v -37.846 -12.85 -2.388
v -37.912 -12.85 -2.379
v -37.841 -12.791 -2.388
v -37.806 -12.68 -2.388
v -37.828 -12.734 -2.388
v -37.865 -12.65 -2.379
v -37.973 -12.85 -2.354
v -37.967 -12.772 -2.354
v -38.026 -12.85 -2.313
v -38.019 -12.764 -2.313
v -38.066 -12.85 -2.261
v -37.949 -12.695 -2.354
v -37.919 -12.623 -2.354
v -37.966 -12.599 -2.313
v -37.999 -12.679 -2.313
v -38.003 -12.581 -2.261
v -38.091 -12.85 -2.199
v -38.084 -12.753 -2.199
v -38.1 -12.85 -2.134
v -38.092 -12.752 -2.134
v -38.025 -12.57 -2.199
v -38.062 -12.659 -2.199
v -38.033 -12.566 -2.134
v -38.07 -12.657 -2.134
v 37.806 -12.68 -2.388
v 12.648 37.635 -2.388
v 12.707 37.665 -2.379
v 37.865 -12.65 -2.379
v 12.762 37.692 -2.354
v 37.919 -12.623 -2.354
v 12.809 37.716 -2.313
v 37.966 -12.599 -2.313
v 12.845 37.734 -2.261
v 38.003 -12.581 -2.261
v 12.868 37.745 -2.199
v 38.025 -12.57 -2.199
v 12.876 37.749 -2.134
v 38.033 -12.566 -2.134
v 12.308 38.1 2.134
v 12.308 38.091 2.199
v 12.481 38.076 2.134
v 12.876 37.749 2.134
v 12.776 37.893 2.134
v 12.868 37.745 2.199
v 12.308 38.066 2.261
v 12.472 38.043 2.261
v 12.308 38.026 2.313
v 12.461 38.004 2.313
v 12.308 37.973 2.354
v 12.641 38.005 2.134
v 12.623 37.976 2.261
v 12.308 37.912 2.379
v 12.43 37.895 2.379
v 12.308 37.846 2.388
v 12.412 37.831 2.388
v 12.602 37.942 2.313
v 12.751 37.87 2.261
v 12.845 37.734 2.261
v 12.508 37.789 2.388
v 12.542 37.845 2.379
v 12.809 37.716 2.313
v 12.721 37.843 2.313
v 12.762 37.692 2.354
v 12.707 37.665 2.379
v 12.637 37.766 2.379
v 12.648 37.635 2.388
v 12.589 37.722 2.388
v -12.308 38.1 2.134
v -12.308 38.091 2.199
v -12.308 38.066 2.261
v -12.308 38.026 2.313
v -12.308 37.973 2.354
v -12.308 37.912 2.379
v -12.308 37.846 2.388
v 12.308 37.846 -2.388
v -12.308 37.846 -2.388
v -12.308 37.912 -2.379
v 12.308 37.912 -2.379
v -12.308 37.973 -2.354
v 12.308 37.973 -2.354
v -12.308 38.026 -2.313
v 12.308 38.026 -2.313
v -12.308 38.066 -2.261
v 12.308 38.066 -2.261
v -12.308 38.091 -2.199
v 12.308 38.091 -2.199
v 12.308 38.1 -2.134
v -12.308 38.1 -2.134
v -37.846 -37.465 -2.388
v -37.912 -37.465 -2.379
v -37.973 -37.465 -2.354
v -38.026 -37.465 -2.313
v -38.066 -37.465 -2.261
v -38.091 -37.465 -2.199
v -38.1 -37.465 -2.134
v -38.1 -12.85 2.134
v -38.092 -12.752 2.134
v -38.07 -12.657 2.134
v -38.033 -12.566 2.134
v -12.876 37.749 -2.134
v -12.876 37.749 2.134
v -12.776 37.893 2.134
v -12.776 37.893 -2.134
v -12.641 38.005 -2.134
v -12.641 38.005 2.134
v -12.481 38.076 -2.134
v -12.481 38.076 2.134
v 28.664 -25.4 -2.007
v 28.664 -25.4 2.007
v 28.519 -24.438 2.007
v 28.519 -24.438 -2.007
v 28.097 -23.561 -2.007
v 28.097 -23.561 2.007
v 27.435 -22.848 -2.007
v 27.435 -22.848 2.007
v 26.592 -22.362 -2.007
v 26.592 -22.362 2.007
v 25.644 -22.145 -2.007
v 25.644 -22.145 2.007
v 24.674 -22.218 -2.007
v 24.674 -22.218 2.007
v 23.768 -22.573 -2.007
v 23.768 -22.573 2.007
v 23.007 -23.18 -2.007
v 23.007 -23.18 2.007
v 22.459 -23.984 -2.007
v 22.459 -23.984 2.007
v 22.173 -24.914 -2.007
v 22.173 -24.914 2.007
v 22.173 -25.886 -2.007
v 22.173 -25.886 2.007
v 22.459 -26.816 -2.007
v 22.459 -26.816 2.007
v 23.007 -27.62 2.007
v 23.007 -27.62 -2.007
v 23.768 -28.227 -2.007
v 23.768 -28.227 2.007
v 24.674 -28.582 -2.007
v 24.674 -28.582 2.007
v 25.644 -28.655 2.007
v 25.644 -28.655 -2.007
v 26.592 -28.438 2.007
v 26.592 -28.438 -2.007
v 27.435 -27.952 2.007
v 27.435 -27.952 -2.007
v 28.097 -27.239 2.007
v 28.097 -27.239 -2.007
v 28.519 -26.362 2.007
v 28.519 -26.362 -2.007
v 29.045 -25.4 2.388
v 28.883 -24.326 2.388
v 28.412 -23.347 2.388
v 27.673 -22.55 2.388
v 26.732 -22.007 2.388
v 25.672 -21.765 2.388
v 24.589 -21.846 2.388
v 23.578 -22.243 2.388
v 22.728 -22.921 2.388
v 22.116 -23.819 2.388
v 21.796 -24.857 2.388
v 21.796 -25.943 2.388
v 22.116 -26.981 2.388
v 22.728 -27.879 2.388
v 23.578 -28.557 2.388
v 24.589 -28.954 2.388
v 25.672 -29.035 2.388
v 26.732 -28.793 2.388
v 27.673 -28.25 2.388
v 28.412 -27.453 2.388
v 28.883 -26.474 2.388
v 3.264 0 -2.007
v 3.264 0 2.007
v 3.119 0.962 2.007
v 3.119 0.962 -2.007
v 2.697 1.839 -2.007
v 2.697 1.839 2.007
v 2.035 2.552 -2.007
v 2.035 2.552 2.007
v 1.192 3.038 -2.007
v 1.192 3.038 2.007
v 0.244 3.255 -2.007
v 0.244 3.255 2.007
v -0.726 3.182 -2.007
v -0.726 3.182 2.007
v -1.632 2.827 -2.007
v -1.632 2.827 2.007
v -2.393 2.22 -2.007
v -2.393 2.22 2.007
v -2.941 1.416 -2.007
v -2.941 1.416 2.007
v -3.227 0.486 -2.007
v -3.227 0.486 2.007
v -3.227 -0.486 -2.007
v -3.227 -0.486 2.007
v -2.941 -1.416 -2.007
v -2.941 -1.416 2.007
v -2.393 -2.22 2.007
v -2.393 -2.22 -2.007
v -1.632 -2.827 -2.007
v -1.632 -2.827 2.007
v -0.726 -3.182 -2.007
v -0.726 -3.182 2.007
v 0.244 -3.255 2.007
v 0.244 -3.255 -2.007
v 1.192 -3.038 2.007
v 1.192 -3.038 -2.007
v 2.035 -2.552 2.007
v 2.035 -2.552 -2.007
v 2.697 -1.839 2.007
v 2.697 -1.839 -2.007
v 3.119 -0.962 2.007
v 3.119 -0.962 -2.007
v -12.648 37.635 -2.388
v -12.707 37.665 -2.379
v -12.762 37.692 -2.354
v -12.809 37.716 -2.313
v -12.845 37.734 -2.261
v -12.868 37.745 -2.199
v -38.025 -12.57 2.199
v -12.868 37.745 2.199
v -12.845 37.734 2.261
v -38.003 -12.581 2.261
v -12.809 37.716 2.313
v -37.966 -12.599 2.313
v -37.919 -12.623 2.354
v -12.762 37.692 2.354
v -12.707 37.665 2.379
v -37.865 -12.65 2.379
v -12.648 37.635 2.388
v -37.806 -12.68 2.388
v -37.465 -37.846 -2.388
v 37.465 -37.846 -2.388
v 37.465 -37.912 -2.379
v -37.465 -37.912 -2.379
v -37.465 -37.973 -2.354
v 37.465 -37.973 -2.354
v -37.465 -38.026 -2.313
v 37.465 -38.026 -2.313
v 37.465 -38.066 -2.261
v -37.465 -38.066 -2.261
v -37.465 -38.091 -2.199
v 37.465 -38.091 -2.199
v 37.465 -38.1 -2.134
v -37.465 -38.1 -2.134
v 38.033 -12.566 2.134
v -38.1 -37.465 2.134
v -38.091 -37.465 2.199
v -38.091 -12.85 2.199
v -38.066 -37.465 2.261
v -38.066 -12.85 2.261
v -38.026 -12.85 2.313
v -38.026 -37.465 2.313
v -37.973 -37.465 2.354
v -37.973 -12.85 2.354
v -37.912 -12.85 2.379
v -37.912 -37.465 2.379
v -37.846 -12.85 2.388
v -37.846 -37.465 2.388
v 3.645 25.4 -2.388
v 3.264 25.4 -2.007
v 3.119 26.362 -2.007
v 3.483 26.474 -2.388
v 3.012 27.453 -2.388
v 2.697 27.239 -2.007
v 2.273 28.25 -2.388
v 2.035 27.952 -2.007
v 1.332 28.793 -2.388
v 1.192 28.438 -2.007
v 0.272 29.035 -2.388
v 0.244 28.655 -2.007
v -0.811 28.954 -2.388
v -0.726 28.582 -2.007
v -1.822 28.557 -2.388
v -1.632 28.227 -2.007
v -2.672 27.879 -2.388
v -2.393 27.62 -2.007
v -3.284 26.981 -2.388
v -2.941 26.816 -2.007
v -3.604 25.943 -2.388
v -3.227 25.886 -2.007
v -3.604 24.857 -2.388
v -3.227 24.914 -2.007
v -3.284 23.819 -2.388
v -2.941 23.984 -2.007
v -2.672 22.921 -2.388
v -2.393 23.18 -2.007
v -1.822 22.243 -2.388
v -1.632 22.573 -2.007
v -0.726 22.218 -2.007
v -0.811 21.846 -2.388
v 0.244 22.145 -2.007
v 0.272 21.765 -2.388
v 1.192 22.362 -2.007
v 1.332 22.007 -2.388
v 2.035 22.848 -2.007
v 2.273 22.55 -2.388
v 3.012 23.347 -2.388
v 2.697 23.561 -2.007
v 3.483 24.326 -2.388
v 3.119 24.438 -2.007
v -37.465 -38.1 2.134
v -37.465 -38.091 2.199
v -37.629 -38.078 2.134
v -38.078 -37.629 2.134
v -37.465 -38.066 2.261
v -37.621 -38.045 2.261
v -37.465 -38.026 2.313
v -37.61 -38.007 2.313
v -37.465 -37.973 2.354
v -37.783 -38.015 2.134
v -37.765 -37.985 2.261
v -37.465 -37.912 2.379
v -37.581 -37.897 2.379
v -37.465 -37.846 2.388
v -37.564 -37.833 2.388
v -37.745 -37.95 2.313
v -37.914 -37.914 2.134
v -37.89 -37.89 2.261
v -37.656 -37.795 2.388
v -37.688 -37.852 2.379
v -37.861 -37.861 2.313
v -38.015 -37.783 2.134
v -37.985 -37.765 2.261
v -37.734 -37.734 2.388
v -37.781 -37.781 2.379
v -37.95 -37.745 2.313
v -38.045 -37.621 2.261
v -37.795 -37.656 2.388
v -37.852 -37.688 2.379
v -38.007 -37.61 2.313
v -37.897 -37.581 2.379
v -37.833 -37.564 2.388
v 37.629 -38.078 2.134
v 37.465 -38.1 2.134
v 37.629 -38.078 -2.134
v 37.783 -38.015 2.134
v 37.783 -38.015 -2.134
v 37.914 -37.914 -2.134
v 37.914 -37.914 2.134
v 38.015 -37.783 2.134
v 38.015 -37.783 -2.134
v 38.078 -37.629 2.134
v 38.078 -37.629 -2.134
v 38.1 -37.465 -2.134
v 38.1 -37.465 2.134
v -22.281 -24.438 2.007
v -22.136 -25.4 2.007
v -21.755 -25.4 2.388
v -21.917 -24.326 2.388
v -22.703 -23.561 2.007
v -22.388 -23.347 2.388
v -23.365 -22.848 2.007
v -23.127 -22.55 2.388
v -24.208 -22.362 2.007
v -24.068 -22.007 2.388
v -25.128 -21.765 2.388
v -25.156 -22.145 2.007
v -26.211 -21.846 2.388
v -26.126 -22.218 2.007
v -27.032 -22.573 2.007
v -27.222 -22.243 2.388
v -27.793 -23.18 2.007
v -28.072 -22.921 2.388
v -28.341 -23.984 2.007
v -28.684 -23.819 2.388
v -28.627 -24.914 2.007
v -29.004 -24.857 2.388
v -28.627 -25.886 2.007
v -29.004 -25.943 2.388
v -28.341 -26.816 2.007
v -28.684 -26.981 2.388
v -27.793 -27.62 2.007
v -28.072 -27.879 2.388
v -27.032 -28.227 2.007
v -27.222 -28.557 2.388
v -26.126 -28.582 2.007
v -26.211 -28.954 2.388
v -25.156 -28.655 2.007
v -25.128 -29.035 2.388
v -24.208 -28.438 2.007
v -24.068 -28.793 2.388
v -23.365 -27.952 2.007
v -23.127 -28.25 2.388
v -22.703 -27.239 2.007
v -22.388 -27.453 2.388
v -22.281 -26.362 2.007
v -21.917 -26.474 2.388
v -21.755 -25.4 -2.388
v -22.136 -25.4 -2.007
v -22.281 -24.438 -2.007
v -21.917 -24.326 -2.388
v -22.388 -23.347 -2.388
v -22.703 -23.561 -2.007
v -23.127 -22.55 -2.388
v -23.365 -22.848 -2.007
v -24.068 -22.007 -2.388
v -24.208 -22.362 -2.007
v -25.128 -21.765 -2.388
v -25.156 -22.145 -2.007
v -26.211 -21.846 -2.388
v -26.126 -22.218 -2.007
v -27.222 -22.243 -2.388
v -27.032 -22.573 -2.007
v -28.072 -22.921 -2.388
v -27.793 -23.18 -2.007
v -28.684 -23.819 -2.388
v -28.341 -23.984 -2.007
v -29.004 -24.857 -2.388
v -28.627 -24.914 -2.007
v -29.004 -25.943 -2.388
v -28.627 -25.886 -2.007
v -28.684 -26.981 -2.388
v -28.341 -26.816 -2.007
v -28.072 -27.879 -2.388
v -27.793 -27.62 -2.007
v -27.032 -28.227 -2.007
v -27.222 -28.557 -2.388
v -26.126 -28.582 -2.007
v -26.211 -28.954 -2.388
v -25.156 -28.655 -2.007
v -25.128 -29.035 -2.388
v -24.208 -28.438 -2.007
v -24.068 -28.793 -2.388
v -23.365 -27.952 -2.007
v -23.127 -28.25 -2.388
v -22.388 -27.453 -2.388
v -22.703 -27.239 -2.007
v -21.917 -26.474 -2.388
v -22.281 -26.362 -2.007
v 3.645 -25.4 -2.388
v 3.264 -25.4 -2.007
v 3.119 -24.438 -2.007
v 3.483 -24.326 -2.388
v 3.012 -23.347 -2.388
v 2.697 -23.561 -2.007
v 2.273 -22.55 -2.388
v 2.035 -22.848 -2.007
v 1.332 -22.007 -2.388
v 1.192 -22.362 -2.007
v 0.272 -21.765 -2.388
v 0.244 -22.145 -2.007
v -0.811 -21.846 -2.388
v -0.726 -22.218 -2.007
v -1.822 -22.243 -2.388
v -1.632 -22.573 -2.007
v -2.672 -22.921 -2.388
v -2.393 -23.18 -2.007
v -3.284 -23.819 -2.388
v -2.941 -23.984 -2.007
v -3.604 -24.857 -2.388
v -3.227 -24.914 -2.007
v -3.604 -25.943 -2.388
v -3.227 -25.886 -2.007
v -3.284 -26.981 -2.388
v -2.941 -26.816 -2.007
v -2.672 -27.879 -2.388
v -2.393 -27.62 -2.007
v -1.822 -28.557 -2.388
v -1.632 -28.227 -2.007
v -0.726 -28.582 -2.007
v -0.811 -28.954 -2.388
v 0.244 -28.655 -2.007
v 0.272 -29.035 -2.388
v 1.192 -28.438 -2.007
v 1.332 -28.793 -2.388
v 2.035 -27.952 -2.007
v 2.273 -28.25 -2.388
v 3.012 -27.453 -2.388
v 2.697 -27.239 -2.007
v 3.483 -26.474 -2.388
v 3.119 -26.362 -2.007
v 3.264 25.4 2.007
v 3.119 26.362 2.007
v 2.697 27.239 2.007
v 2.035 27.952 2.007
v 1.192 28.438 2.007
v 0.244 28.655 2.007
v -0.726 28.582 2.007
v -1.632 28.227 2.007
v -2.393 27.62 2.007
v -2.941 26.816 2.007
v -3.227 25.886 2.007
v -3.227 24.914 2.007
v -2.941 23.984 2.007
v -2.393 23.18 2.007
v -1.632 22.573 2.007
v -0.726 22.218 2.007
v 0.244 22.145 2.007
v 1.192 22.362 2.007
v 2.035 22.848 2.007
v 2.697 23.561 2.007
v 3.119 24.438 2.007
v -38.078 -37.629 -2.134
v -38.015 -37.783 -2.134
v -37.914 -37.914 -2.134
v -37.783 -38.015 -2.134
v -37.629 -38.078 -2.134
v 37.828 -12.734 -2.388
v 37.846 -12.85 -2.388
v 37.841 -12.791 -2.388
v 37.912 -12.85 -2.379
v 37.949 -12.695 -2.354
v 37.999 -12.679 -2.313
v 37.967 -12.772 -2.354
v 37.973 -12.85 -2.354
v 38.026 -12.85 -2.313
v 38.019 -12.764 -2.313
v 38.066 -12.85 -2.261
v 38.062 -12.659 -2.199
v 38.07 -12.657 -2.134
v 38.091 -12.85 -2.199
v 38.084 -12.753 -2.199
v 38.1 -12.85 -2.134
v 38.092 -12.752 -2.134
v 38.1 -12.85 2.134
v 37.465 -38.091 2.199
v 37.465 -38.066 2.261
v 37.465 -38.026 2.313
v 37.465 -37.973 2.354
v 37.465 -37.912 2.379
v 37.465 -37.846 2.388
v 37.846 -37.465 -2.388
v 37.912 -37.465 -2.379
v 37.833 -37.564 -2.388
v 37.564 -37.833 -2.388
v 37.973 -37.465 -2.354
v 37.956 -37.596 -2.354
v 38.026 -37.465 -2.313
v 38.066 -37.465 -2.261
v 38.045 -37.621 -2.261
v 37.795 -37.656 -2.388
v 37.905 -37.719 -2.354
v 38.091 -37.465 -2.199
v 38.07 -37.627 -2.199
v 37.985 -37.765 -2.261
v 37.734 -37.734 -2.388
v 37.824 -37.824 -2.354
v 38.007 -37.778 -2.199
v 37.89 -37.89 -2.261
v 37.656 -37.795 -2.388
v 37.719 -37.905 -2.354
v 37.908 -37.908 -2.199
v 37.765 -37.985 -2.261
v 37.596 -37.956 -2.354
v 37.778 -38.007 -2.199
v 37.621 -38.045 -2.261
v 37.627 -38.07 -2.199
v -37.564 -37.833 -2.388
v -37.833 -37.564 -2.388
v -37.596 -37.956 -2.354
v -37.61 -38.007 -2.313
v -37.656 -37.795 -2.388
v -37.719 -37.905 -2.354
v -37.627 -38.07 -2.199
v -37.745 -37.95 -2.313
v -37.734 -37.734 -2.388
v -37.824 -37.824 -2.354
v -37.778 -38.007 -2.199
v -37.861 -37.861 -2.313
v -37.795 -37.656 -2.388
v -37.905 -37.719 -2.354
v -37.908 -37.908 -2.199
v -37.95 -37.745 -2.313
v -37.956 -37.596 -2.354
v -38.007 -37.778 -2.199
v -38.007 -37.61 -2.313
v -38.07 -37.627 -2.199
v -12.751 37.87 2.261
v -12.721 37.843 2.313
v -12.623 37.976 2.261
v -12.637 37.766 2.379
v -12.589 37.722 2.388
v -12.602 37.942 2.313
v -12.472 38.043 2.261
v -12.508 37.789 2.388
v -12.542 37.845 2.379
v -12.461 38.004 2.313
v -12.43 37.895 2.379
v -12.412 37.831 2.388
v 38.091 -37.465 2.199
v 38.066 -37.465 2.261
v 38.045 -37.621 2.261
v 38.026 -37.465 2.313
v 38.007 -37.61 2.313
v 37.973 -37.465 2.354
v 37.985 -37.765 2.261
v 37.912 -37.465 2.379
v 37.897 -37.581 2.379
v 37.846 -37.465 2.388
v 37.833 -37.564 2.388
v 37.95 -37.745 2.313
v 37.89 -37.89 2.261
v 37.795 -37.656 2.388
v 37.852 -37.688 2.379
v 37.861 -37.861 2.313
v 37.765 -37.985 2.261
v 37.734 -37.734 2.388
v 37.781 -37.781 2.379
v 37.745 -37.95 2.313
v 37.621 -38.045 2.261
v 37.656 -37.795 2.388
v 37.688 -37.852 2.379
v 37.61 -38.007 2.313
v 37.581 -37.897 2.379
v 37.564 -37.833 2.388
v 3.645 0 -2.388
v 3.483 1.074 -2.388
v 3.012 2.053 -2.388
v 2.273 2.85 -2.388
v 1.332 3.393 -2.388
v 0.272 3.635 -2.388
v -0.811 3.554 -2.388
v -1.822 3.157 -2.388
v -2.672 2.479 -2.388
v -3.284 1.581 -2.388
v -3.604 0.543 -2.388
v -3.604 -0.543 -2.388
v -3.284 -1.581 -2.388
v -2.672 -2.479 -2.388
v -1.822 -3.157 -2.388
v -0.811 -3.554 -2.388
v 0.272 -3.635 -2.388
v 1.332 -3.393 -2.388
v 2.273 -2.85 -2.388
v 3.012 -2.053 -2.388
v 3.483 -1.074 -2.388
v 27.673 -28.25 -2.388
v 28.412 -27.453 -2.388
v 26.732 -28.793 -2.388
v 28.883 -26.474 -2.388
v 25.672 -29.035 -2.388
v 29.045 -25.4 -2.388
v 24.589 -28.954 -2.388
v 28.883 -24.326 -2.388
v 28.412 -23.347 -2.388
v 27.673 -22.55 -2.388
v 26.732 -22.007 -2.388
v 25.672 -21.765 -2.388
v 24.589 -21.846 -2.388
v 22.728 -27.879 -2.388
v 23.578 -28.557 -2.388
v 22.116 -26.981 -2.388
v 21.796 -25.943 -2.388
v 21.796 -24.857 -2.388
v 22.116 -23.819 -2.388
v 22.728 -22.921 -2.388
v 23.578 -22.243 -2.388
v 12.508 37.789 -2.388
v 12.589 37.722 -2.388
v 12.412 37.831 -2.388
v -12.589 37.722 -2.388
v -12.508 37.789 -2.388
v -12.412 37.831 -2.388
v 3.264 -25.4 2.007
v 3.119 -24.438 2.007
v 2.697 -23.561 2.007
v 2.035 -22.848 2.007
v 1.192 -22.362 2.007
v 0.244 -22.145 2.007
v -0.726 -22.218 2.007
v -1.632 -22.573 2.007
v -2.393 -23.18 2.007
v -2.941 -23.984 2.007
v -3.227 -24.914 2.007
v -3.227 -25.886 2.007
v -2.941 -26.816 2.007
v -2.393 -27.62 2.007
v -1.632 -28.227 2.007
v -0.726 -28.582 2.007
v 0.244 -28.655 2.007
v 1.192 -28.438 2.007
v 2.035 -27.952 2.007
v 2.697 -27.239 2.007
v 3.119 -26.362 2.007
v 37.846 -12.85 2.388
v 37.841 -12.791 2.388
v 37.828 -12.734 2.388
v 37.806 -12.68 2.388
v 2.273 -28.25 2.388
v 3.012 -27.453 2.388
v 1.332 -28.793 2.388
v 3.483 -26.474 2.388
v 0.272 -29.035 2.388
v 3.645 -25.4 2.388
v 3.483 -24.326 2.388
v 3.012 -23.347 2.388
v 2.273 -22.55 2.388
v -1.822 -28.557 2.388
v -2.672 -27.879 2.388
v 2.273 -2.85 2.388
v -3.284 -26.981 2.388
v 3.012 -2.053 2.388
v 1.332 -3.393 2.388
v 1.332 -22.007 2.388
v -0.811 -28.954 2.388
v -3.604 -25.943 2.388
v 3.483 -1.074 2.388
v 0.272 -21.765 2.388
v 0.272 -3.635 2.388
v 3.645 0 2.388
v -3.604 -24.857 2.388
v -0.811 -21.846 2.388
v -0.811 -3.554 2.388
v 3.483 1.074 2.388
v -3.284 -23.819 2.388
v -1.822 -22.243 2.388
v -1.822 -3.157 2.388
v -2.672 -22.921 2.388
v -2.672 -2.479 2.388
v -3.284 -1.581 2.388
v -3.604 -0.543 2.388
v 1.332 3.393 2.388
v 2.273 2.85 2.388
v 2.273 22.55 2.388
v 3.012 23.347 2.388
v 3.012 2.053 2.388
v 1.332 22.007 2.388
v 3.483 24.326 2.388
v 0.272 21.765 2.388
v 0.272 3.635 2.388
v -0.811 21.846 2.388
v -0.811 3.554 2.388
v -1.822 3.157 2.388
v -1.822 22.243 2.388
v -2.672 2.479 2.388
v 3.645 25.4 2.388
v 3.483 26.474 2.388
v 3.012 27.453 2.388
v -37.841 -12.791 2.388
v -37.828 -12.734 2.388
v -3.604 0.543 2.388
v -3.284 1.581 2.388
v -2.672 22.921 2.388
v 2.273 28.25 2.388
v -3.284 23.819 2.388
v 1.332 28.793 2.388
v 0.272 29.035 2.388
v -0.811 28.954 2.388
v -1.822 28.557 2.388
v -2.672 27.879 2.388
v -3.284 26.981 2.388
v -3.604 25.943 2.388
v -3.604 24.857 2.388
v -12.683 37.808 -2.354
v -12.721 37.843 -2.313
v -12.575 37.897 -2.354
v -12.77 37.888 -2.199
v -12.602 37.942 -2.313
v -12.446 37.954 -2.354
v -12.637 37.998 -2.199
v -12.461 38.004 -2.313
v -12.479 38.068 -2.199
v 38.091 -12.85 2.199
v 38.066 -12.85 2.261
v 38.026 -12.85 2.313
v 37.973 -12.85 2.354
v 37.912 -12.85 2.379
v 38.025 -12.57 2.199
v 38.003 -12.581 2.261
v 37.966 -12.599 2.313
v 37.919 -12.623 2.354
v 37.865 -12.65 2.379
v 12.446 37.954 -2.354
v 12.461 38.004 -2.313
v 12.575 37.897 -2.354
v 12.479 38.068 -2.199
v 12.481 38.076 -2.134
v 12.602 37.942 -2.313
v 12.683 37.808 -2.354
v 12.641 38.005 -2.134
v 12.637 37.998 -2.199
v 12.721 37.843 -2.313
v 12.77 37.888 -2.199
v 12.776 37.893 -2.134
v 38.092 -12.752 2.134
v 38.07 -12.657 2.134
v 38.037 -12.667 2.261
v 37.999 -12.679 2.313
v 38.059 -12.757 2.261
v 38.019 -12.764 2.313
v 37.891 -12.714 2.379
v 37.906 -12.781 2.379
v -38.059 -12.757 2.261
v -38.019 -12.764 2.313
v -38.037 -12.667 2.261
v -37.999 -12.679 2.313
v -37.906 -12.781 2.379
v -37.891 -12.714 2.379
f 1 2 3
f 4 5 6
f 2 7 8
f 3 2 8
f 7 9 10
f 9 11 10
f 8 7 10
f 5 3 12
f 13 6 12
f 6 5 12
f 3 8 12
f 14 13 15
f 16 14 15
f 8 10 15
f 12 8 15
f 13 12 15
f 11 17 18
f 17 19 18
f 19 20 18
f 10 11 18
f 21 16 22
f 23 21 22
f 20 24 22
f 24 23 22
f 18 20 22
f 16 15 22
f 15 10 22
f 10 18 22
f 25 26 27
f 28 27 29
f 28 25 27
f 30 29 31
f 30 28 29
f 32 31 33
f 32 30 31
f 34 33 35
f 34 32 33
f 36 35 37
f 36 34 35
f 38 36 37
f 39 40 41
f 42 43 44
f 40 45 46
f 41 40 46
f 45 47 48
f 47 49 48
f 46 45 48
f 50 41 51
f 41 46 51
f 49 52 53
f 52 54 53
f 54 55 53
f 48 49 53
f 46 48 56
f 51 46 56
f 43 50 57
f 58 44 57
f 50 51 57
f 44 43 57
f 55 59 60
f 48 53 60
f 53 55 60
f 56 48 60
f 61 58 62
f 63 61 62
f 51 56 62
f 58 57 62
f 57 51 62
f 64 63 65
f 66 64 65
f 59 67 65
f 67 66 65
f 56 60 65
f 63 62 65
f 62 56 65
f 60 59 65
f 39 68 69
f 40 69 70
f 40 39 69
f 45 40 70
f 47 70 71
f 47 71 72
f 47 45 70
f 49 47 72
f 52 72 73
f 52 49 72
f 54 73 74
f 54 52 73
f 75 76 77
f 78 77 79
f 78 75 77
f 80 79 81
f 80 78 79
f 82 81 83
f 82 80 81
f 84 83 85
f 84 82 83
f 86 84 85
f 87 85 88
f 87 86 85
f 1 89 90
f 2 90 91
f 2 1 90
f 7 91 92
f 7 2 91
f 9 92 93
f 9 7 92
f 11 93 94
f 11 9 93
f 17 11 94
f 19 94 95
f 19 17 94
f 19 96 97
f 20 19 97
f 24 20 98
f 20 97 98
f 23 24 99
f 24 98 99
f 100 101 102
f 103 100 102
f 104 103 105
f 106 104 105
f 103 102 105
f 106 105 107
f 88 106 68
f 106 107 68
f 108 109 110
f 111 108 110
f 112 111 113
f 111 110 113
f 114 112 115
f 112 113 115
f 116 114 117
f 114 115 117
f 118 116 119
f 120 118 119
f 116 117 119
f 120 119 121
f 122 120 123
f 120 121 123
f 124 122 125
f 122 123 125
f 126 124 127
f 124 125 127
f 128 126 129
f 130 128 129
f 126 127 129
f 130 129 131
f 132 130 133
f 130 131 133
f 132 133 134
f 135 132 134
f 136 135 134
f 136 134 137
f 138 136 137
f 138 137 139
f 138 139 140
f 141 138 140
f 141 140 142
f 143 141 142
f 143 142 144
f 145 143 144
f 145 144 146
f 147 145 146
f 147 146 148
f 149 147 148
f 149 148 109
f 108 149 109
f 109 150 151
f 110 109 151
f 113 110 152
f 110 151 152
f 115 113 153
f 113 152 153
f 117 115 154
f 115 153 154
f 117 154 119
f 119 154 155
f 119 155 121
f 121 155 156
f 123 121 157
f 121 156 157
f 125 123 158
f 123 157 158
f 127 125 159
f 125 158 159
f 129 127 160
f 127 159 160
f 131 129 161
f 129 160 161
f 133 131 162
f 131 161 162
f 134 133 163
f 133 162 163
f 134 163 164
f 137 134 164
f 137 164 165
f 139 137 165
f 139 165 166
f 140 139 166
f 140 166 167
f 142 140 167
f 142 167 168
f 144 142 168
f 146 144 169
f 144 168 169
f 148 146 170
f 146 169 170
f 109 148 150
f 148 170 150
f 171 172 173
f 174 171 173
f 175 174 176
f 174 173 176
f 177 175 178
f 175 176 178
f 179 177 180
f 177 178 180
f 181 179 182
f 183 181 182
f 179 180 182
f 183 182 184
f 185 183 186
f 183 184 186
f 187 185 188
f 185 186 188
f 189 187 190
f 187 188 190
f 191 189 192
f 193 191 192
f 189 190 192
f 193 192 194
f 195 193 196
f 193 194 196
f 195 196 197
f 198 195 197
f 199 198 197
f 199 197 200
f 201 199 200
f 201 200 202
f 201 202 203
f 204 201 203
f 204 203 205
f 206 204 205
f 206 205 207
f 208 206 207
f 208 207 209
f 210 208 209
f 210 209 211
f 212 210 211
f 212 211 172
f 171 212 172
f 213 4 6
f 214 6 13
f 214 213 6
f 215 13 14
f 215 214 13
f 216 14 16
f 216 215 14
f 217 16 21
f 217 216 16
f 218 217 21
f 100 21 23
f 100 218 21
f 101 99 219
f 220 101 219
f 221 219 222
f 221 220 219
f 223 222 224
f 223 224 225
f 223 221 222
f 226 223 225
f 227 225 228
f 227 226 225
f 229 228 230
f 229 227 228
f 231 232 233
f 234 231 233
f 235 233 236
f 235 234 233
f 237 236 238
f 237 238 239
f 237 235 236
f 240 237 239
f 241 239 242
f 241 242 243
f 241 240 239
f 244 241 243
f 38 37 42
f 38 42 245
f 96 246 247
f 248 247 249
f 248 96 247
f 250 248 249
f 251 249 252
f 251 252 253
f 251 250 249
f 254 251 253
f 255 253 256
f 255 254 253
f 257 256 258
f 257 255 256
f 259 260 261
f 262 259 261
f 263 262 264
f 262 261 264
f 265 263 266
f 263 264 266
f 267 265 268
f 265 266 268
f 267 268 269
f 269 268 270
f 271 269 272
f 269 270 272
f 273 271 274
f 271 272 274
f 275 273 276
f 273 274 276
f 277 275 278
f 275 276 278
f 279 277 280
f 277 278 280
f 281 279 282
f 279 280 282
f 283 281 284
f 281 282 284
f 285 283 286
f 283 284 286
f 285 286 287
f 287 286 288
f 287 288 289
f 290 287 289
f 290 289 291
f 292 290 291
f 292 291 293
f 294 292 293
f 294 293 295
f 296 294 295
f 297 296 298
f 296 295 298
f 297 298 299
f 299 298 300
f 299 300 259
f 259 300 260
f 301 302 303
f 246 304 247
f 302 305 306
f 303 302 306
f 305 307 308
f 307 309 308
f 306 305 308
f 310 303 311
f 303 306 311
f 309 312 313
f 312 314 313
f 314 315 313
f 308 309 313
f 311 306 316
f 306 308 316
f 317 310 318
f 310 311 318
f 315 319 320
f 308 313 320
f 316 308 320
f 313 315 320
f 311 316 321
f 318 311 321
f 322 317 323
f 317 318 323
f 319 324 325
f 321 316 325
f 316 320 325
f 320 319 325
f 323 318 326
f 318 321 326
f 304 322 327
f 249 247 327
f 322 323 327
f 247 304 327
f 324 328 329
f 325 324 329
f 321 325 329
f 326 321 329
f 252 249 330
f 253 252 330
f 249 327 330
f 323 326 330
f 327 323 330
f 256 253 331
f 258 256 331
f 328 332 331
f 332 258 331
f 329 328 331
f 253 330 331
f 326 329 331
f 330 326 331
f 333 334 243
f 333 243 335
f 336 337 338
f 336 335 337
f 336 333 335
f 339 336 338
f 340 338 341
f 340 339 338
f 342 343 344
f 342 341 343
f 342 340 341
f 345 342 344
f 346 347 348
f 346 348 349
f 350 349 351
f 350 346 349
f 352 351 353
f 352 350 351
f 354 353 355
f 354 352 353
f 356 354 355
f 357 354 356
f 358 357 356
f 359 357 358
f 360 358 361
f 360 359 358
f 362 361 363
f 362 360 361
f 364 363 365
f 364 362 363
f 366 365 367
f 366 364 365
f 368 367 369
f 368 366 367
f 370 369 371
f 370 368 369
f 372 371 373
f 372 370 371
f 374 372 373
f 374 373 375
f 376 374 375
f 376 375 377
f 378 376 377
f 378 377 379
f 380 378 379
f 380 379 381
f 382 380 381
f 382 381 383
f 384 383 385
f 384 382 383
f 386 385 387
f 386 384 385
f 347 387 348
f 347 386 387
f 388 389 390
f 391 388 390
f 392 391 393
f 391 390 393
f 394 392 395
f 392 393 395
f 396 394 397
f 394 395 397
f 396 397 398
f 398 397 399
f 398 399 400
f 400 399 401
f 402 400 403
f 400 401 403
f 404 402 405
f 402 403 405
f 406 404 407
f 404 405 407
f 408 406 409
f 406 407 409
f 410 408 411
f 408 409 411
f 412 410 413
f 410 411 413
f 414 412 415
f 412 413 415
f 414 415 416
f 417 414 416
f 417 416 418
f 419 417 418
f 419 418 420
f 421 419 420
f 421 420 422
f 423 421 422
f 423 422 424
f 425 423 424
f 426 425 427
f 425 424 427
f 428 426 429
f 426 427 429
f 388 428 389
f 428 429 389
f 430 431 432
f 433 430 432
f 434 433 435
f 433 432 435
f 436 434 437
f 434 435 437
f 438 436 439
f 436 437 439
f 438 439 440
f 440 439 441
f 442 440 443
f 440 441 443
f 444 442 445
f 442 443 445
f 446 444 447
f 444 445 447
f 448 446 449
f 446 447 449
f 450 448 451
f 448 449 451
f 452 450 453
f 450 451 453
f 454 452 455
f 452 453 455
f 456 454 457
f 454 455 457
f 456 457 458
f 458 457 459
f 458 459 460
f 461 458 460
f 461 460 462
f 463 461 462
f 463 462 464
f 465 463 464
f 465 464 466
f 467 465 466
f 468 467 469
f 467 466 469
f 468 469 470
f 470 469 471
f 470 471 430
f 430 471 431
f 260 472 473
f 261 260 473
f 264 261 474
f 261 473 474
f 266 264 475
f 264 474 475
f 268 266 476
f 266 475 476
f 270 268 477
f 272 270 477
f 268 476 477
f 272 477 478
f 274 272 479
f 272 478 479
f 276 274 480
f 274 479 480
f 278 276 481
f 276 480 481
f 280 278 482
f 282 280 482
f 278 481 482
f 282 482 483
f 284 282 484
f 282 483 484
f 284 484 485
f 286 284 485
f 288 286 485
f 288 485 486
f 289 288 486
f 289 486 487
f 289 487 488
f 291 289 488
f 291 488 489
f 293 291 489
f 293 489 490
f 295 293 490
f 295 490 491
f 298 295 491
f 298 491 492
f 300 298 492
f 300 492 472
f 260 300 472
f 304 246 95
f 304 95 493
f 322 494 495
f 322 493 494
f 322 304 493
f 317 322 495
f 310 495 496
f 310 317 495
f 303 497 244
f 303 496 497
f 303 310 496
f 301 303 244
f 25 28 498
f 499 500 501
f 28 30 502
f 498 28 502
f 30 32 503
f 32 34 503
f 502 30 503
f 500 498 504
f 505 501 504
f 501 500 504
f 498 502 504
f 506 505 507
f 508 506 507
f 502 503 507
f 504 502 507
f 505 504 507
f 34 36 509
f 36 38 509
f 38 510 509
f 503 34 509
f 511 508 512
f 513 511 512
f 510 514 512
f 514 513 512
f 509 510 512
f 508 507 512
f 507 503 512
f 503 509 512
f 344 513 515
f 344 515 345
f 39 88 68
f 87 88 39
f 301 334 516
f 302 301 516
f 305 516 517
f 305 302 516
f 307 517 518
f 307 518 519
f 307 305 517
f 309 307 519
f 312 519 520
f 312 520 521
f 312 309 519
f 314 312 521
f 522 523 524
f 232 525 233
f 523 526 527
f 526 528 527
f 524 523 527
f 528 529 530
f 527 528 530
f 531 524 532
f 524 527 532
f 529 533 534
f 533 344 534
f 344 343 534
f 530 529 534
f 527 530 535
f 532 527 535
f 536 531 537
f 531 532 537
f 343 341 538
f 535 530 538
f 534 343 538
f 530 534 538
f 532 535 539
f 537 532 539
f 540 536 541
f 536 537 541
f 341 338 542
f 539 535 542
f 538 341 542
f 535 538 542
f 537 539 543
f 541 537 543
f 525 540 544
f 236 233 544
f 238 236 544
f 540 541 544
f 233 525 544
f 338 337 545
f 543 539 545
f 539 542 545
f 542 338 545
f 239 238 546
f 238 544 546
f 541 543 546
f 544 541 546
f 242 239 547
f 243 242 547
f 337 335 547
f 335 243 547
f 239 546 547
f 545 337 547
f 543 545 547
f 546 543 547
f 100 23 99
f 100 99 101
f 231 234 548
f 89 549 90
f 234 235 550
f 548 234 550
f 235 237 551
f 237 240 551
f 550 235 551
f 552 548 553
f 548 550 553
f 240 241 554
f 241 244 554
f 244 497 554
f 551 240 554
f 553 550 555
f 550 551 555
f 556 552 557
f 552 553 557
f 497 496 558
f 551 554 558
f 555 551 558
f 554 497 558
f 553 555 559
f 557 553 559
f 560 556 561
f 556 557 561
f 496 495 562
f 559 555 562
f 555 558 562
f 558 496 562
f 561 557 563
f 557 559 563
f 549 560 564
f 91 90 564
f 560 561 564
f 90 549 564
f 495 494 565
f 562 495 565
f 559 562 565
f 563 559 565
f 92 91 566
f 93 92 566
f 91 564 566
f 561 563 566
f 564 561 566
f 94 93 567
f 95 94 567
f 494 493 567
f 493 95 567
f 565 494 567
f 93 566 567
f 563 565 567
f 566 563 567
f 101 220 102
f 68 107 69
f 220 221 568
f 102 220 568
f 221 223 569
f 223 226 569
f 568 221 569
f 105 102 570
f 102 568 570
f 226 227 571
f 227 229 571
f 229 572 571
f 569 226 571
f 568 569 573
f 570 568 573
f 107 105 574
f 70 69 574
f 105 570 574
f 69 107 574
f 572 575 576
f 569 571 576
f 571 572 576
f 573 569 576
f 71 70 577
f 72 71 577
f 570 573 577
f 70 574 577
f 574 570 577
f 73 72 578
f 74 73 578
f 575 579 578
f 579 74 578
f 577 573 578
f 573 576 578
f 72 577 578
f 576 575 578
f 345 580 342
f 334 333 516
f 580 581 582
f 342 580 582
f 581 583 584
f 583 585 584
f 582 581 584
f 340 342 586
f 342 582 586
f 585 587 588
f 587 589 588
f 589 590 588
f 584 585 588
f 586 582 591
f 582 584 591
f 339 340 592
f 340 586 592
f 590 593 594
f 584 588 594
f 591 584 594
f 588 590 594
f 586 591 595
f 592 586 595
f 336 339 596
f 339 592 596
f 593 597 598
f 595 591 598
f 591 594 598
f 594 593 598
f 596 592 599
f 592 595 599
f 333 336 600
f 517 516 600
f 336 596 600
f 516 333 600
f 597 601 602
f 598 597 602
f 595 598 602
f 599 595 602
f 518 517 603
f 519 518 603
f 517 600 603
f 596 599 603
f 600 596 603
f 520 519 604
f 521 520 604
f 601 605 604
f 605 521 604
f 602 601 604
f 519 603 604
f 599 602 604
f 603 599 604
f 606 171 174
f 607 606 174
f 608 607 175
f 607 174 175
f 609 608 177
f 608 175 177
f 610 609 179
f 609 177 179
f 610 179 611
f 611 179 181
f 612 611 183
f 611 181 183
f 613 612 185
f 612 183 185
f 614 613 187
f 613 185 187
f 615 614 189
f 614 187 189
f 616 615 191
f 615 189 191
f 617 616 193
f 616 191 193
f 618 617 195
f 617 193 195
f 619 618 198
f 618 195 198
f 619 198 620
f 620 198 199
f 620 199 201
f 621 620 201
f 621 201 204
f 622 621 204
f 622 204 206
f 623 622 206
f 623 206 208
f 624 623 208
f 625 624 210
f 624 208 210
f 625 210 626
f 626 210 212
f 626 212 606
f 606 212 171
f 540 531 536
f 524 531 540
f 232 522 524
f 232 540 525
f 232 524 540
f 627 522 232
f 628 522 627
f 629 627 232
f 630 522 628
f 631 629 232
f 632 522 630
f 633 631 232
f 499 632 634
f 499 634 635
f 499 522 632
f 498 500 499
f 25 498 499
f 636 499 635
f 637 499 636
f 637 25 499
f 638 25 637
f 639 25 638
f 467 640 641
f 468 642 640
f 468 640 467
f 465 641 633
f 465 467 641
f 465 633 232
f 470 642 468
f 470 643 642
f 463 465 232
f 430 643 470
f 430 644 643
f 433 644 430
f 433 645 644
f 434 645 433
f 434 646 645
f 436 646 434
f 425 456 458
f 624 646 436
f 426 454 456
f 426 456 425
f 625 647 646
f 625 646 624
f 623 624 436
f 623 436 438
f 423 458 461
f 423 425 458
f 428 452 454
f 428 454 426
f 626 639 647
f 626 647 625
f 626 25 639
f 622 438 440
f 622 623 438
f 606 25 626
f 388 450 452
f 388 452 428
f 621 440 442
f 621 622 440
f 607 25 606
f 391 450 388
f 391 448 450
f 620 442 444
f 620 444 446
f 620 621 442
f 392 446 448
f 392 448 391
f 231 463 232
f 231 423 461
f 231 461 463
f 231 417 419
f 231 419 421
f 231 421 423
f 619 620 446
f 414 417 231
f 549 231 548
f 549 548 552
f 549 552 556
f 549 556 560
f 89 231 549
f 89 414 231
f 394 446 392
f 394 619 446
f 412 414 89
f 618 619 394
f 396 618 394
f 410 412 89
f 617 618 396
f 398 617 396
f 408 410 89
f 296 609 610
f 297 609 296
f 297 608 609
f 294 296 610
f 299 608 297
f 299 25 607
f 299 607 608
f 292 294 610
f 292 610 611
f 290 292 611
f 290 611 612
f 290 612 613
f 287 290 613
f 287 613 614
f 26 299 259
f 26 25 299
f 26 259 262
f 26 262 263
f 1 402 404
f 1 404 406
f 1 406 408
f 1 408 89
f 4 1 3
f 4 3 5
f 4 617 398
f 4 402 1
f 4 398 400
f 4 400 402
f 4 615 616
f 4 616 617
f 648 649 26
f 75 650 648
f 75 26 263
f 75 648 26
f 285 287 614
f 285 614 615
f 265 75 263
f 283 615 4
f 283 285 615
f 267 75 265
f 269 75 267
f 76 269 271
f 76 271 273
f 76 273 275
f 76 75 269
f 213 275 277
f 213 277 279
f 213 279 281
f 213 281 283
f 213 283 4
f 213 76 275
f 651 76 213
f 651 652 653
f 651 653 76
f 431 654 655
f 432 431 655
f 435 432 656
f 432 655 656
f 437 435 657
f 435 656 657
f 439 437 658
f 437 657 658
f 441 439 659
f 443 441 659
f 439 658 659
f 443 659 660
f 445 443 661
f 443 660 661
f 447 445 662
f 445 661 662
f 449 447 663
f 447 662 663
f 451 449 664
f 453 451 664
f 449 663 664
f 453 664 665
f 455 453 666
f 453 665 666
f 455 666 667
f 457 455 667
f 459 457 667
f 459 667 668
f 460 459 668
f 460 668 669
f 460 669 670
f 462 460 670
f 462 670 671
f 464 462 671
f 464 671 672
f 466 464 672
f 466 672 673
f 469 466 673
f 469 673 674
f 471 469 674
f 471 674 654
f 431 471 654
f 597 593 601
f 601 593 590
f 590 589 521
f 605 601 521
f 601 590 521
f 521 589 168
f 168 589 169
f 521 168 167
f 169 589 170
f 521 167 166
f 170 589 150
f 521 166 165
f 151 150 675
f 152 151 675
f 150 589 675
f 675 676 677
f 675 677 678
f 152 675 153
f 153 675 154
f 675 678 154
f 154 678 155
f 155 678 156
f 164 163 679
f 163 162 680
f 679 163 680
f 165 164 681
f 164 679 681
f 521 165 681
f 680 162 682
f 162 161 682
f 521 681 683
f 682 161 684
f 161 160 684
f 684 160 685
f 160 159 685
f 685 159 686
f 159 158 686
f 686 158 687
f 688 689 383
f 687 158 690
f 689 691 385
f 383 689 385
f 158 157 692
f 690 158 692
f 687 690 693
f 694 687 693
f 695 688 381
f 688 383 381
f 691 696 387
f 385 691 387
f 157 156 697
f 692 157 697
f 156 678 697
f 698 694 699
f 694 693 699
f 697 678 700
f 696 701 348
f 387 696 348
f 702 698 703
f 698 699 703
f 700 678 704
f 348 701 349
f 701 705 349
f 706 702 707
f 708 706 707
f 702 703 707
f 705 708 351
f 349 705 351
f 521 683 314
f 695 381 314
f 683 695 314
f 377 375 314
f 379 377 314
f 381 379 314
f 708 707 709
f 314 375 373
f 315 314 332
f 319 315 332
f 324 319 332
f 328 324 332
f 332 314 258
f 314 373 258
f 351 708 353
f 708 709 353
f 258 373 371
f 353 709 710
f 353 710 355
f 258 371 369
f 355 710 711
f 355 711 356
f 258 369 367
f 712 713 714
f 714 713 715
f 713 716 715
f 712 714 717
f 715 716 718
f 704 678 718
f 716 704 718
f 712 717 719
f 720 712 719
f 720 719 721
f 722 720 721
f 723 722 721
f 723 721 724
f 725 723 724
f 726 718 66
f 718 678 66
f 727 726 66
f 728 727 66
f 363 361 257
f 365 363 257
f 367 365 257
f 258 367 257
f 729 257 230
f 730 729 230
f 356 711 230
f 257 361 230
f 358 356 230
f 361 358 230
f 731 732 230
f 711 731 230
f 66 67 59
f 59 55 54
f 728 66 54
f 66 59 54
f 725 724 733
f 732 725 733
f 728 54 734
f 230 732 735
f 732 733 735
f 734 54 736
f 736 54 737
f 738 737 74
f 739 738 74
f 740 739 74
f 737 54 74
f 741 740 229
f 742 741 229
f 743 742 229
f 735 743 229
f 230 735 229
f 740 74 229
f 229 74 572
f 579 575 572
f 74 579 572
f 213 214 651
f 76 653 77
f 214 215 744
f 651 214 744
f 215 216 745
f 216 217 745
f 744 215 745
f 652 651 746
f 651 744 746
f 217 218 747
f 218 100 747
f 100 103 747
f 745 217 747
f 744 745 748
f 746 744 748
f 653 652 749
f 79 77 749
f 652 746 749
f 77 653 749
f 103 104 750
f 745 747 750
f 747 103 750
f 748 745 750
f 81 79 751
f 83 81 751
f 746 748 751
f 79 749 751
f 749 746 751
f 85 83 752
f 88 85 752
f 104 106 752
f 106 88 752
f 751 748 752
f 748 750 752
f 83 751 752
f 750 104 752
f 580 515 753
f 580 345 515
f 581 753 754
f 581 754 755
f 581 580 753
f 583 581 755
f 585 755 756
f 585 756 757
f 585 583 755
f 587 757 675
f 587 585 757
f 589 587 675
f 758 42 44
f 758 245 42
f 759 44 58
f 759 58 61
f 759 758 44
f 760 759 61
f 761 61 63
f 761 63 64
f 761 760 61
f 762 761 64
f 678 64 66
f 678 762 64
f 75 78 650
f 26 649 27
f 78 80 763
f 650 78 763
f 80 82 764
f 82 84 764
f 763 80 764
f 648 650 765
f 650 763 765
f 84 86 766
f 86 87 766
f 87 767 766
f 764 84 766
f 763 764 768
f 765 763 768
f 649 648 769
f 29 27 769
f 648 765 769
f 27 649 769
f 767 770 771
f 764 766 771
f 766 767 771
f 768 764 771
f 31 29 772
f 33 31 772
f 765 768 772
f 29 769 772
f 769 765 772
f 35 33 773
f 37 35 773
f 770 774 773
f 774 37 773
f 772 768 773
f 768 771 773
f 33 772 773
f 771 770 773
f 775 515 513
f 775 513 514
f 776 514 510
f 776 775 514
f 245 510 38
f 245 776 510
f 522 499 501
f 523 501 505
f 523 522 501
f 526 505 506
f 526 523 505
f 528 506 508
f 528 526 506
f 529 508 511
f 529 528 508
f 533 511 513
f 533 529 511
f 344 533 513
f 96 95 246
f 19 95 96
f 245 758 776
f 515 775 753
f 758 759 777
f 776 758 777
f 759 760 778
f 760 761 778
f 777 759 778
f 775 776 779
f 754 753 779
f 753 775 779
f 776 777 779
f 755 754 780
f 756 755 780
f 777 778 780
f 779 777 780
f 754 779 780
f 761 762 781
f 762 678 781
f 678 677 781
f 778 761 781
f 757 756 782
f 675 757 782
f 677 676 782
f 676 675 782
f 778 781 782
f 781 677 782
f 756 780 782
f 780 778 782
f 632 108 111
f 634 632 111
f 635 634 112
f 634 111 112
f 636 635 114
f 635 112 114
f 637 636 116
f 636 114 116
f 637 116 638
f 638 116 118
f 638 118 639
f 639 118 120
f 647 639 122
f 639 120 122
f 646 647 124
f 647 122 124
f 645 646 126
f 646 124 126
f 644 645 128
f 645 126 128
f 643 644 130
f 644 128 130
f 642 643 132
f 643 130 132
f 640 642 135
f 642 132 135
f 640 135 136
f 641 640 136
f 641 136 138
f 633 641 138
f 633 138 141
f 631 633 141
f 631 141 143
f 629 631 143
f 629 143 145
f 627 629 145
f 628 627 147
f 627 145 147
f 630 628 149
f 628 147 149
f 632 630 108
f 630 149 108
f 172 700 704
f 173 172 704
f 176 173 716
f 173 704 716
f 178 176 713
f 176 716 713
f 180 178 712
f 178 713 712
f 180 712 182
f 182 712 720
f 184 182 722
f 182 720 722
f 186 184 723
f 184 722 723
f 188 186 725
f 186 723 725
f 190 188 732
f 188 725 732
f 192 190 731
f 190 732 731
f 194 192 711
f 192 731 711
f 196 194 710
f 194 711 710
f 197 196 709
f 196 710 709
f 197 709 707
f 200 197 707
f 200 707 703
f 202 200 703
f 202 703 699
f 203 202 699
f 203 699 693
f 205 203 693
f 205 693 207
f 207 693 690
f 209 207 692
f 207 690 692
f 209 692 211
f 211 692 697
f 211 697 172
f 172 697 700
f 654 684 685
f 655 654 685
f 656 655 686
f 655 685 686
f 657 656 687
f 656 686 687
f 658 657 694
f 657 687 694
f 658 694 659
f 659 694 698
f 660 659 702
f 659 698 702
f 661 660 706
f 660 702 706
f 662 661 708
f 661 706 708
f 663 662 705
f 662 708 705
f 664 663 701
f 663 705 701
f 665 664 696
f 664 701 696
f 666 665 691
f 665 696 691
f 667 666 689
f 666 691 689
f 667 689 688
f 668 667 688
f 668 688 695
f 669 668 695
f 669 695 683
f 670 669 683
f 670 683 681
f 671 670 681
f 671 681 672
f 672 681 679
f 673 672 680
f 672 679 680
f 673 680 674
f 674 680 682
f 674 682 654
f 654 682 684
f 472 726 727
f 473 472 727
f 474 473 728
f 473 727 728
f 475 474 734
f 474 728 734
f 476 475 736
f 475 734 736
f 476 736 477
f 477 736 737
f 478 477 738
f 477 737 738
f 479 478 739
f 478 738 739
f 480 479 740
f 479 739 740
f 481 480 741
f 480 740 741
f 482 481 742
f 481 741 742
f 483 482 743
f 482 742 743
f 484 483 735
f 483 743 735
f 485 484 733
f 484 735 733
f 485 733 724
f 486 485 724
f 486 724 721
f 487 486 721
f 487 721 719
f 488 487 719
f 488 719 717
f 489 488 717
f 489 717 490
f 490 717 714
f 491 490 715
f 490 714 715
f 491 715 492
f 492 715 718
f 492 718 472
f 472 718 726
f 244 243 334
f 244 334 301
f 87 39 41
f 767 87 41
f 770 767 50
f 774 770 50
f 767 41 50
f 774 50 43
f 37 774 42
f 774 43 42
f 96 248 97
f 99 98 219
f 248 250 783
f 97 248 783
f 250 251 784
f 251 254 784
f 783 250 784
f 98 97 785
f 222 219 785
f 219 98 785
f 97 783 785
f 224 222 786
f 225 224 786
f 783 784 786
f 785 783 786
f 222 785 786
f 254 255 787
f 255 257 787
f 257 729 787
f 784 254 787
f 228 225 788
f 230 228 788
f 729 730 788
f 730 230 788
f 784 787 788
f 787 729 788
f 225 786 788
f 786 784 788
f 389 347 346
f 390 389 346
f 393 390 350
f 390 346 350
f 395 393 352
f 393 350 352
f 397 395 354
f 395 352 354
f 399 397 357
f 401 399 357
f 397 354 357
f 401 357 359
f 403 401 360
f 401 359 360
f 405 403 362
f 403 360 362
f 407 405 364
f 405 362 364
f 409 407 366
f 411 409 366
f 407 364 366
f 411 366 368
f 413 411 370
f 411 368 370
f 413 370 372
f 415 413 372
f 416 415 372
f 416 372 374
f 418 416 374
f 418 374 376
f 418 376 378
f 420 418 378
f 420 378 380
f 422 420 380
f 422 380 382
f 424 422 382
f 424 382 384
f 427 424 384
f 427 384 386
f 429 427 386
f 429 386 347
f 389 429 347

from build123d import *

# Parameters (mm, degrees)
BOSS_EXTRUDE1_START        = -2.3876
BOSS_EXTRUDE1_DEPTH        = 4.7752
SKETCH4_R                  = 3.2639
CUT_EXTRUDE1_DEPTH         = 55.092721646
CHAMFER1_SIZE              = 0.381
LPATTERN1_COUNT            = 3
LPATTERN1_PITCH            = 25.4
LPATTERN1_COUNT_DIR2       = 3
LPATTERN1_PITCH_DIR2       = 25.4
CHAMFER1_OF_LPATTERN1_SIZE = 0.381
FILLET1_R                  = 0.635
FILLET2_R                  = 0.254


with BuildPart() as part:
    # Sketch3 → Boss-Extrude1 (new body)
    with BuildSketch(Plane.XY.offset(BOSS_EXTRUDE1_START)):
        Polygon((-38.1, -38.1), (-38.1, -12.7), (-12.7, 38.1), (12.7, 38.1), (38.1, -12.7), (38.1, -38.1), align=None)
    extrude(amount=BOSS_EXTRUDE1_DEPTH)

    # Sketch4 → Cut-Extrude1 (cut, through all)
    with BuildSketch(Plane.XY.offset(2.3876)):
        with Locations((-25.4, -25.4)):
            Circle(SKETCH4_R)
    cut_extrude1 = extrude(amount=-CUT_EXTRUDE1_DEPTH, mode=Mode.SUBTRACT)

    # Chamfer1
    chamfer1_edges = [part.edges().sort_by_distance(p)[0] for p in [
        (-28.6639, -25.4, -2.3876),
        (-28.6639, -25.4, 2.3876),
    ]]
    chamfer(chamfer1_edges, length=CHAMFER1_SIZE)

    # LPattern1: Cut-Extrude1 3 × 3, 4 skipped
    with Locations(*[(i * LPATTERN1_PITCH, j * LPATTERN1_PITCH_DIR2, 0) for i in range(LPATTERN1_COUNT) for j in range(LPATTERN1_COUNT_DIR2) if (i, j) not in ((0, 0), (0, 1), (0, 2), (2, 1), (2, 2))]):
        add(cut_extrude1, mode=Mode.SUBTRACT)

    # Chamfer1 of LPattern1
    chamfer1_of_lpattern1_edges = [part.edges().sort_by_distance(p)[0] for p in [
        (-3.2639, -25.4, -2.3876),
        (-3.2639, -25.4, 2.3876),
        (-3.2639, 0, -2.3876),
        (-3.2639, 0, 2.3876),
        (-3.2639, 25.4, -2.3876),
        (-3.2639, 25.4, 2.3876),
        (22.1361, -25.4, -2.3876),
        (22.1361, -25.4, 2.3876),
    ]]
    chamfer(chamfer1_of_lpattern1_edges, length=CHAMFER1_OF_LPATTERN1_SIZE)

    # Fillet1
    fillet1_edges = [part.edges().sort_by_distance(p)[0] for p in [
        (-38.1, -38.1, 0),
        (-38.1, -12.7, 0),
        (-12.7, 38.1, 0),
        (12.7, 38.1, 0),
        (38.1, -12.7, 0),
        (38.1, -38.1, 0),
    ]]
    fillet(fillet1_edges, radius=FILLET1_R)

    # Fillet2
    fillet2_edges = [part.edges().sort_by_distance(p)[0] for p in [
        (0, -38.1, -2.3876),
        (0, -38.1, 2.3876),
        (-38.1, -25.157451583, -2.3876),
        (-25.454235475, 12.59152905, -2.3876),
        (0, 38.1, -2.3876),
        (25.454235475, 12.59152905, -2.3876),
        (38.1, -25.157451583, -2.3876),
        (38.083013108, -12.704010061, -2.3876),
        (37.914012806, -37.914012806, -2.3876),
        (12.641387673, 38.005163263, -2.3876),
        (-12.641387673, 38.005163263, -2.3876),
        (-38.083013108, -12.704010061, -2.3876),
        (-37.914012806, -37.914012806, -2.3876),
        (-38.1, -25.157451583, 2.3876),
        (38.1, -25.157451583, 2.3876),
        (25.454235475, 12.59152905, 2.3876),
        (0, 38.1, 2.3876),
        (-25.454235475, 12.59152905, 2.3876),
        (38.083013108, -12.704010061, 2.3876),
        (37.914012806, -37.914012806, 2.3876),
        (12.641387673, 38.005163263, 2.3876),
        (-12.641387673, 38.005163263, 2.3876),
        (-38.083013108, -12.704010061, 2.3876),
        (-37.914012806, -37.914012806, 2.3876),
    ]]
    fillet(fillet2_edges, radius=FILLET2_R)


solid = part.part
